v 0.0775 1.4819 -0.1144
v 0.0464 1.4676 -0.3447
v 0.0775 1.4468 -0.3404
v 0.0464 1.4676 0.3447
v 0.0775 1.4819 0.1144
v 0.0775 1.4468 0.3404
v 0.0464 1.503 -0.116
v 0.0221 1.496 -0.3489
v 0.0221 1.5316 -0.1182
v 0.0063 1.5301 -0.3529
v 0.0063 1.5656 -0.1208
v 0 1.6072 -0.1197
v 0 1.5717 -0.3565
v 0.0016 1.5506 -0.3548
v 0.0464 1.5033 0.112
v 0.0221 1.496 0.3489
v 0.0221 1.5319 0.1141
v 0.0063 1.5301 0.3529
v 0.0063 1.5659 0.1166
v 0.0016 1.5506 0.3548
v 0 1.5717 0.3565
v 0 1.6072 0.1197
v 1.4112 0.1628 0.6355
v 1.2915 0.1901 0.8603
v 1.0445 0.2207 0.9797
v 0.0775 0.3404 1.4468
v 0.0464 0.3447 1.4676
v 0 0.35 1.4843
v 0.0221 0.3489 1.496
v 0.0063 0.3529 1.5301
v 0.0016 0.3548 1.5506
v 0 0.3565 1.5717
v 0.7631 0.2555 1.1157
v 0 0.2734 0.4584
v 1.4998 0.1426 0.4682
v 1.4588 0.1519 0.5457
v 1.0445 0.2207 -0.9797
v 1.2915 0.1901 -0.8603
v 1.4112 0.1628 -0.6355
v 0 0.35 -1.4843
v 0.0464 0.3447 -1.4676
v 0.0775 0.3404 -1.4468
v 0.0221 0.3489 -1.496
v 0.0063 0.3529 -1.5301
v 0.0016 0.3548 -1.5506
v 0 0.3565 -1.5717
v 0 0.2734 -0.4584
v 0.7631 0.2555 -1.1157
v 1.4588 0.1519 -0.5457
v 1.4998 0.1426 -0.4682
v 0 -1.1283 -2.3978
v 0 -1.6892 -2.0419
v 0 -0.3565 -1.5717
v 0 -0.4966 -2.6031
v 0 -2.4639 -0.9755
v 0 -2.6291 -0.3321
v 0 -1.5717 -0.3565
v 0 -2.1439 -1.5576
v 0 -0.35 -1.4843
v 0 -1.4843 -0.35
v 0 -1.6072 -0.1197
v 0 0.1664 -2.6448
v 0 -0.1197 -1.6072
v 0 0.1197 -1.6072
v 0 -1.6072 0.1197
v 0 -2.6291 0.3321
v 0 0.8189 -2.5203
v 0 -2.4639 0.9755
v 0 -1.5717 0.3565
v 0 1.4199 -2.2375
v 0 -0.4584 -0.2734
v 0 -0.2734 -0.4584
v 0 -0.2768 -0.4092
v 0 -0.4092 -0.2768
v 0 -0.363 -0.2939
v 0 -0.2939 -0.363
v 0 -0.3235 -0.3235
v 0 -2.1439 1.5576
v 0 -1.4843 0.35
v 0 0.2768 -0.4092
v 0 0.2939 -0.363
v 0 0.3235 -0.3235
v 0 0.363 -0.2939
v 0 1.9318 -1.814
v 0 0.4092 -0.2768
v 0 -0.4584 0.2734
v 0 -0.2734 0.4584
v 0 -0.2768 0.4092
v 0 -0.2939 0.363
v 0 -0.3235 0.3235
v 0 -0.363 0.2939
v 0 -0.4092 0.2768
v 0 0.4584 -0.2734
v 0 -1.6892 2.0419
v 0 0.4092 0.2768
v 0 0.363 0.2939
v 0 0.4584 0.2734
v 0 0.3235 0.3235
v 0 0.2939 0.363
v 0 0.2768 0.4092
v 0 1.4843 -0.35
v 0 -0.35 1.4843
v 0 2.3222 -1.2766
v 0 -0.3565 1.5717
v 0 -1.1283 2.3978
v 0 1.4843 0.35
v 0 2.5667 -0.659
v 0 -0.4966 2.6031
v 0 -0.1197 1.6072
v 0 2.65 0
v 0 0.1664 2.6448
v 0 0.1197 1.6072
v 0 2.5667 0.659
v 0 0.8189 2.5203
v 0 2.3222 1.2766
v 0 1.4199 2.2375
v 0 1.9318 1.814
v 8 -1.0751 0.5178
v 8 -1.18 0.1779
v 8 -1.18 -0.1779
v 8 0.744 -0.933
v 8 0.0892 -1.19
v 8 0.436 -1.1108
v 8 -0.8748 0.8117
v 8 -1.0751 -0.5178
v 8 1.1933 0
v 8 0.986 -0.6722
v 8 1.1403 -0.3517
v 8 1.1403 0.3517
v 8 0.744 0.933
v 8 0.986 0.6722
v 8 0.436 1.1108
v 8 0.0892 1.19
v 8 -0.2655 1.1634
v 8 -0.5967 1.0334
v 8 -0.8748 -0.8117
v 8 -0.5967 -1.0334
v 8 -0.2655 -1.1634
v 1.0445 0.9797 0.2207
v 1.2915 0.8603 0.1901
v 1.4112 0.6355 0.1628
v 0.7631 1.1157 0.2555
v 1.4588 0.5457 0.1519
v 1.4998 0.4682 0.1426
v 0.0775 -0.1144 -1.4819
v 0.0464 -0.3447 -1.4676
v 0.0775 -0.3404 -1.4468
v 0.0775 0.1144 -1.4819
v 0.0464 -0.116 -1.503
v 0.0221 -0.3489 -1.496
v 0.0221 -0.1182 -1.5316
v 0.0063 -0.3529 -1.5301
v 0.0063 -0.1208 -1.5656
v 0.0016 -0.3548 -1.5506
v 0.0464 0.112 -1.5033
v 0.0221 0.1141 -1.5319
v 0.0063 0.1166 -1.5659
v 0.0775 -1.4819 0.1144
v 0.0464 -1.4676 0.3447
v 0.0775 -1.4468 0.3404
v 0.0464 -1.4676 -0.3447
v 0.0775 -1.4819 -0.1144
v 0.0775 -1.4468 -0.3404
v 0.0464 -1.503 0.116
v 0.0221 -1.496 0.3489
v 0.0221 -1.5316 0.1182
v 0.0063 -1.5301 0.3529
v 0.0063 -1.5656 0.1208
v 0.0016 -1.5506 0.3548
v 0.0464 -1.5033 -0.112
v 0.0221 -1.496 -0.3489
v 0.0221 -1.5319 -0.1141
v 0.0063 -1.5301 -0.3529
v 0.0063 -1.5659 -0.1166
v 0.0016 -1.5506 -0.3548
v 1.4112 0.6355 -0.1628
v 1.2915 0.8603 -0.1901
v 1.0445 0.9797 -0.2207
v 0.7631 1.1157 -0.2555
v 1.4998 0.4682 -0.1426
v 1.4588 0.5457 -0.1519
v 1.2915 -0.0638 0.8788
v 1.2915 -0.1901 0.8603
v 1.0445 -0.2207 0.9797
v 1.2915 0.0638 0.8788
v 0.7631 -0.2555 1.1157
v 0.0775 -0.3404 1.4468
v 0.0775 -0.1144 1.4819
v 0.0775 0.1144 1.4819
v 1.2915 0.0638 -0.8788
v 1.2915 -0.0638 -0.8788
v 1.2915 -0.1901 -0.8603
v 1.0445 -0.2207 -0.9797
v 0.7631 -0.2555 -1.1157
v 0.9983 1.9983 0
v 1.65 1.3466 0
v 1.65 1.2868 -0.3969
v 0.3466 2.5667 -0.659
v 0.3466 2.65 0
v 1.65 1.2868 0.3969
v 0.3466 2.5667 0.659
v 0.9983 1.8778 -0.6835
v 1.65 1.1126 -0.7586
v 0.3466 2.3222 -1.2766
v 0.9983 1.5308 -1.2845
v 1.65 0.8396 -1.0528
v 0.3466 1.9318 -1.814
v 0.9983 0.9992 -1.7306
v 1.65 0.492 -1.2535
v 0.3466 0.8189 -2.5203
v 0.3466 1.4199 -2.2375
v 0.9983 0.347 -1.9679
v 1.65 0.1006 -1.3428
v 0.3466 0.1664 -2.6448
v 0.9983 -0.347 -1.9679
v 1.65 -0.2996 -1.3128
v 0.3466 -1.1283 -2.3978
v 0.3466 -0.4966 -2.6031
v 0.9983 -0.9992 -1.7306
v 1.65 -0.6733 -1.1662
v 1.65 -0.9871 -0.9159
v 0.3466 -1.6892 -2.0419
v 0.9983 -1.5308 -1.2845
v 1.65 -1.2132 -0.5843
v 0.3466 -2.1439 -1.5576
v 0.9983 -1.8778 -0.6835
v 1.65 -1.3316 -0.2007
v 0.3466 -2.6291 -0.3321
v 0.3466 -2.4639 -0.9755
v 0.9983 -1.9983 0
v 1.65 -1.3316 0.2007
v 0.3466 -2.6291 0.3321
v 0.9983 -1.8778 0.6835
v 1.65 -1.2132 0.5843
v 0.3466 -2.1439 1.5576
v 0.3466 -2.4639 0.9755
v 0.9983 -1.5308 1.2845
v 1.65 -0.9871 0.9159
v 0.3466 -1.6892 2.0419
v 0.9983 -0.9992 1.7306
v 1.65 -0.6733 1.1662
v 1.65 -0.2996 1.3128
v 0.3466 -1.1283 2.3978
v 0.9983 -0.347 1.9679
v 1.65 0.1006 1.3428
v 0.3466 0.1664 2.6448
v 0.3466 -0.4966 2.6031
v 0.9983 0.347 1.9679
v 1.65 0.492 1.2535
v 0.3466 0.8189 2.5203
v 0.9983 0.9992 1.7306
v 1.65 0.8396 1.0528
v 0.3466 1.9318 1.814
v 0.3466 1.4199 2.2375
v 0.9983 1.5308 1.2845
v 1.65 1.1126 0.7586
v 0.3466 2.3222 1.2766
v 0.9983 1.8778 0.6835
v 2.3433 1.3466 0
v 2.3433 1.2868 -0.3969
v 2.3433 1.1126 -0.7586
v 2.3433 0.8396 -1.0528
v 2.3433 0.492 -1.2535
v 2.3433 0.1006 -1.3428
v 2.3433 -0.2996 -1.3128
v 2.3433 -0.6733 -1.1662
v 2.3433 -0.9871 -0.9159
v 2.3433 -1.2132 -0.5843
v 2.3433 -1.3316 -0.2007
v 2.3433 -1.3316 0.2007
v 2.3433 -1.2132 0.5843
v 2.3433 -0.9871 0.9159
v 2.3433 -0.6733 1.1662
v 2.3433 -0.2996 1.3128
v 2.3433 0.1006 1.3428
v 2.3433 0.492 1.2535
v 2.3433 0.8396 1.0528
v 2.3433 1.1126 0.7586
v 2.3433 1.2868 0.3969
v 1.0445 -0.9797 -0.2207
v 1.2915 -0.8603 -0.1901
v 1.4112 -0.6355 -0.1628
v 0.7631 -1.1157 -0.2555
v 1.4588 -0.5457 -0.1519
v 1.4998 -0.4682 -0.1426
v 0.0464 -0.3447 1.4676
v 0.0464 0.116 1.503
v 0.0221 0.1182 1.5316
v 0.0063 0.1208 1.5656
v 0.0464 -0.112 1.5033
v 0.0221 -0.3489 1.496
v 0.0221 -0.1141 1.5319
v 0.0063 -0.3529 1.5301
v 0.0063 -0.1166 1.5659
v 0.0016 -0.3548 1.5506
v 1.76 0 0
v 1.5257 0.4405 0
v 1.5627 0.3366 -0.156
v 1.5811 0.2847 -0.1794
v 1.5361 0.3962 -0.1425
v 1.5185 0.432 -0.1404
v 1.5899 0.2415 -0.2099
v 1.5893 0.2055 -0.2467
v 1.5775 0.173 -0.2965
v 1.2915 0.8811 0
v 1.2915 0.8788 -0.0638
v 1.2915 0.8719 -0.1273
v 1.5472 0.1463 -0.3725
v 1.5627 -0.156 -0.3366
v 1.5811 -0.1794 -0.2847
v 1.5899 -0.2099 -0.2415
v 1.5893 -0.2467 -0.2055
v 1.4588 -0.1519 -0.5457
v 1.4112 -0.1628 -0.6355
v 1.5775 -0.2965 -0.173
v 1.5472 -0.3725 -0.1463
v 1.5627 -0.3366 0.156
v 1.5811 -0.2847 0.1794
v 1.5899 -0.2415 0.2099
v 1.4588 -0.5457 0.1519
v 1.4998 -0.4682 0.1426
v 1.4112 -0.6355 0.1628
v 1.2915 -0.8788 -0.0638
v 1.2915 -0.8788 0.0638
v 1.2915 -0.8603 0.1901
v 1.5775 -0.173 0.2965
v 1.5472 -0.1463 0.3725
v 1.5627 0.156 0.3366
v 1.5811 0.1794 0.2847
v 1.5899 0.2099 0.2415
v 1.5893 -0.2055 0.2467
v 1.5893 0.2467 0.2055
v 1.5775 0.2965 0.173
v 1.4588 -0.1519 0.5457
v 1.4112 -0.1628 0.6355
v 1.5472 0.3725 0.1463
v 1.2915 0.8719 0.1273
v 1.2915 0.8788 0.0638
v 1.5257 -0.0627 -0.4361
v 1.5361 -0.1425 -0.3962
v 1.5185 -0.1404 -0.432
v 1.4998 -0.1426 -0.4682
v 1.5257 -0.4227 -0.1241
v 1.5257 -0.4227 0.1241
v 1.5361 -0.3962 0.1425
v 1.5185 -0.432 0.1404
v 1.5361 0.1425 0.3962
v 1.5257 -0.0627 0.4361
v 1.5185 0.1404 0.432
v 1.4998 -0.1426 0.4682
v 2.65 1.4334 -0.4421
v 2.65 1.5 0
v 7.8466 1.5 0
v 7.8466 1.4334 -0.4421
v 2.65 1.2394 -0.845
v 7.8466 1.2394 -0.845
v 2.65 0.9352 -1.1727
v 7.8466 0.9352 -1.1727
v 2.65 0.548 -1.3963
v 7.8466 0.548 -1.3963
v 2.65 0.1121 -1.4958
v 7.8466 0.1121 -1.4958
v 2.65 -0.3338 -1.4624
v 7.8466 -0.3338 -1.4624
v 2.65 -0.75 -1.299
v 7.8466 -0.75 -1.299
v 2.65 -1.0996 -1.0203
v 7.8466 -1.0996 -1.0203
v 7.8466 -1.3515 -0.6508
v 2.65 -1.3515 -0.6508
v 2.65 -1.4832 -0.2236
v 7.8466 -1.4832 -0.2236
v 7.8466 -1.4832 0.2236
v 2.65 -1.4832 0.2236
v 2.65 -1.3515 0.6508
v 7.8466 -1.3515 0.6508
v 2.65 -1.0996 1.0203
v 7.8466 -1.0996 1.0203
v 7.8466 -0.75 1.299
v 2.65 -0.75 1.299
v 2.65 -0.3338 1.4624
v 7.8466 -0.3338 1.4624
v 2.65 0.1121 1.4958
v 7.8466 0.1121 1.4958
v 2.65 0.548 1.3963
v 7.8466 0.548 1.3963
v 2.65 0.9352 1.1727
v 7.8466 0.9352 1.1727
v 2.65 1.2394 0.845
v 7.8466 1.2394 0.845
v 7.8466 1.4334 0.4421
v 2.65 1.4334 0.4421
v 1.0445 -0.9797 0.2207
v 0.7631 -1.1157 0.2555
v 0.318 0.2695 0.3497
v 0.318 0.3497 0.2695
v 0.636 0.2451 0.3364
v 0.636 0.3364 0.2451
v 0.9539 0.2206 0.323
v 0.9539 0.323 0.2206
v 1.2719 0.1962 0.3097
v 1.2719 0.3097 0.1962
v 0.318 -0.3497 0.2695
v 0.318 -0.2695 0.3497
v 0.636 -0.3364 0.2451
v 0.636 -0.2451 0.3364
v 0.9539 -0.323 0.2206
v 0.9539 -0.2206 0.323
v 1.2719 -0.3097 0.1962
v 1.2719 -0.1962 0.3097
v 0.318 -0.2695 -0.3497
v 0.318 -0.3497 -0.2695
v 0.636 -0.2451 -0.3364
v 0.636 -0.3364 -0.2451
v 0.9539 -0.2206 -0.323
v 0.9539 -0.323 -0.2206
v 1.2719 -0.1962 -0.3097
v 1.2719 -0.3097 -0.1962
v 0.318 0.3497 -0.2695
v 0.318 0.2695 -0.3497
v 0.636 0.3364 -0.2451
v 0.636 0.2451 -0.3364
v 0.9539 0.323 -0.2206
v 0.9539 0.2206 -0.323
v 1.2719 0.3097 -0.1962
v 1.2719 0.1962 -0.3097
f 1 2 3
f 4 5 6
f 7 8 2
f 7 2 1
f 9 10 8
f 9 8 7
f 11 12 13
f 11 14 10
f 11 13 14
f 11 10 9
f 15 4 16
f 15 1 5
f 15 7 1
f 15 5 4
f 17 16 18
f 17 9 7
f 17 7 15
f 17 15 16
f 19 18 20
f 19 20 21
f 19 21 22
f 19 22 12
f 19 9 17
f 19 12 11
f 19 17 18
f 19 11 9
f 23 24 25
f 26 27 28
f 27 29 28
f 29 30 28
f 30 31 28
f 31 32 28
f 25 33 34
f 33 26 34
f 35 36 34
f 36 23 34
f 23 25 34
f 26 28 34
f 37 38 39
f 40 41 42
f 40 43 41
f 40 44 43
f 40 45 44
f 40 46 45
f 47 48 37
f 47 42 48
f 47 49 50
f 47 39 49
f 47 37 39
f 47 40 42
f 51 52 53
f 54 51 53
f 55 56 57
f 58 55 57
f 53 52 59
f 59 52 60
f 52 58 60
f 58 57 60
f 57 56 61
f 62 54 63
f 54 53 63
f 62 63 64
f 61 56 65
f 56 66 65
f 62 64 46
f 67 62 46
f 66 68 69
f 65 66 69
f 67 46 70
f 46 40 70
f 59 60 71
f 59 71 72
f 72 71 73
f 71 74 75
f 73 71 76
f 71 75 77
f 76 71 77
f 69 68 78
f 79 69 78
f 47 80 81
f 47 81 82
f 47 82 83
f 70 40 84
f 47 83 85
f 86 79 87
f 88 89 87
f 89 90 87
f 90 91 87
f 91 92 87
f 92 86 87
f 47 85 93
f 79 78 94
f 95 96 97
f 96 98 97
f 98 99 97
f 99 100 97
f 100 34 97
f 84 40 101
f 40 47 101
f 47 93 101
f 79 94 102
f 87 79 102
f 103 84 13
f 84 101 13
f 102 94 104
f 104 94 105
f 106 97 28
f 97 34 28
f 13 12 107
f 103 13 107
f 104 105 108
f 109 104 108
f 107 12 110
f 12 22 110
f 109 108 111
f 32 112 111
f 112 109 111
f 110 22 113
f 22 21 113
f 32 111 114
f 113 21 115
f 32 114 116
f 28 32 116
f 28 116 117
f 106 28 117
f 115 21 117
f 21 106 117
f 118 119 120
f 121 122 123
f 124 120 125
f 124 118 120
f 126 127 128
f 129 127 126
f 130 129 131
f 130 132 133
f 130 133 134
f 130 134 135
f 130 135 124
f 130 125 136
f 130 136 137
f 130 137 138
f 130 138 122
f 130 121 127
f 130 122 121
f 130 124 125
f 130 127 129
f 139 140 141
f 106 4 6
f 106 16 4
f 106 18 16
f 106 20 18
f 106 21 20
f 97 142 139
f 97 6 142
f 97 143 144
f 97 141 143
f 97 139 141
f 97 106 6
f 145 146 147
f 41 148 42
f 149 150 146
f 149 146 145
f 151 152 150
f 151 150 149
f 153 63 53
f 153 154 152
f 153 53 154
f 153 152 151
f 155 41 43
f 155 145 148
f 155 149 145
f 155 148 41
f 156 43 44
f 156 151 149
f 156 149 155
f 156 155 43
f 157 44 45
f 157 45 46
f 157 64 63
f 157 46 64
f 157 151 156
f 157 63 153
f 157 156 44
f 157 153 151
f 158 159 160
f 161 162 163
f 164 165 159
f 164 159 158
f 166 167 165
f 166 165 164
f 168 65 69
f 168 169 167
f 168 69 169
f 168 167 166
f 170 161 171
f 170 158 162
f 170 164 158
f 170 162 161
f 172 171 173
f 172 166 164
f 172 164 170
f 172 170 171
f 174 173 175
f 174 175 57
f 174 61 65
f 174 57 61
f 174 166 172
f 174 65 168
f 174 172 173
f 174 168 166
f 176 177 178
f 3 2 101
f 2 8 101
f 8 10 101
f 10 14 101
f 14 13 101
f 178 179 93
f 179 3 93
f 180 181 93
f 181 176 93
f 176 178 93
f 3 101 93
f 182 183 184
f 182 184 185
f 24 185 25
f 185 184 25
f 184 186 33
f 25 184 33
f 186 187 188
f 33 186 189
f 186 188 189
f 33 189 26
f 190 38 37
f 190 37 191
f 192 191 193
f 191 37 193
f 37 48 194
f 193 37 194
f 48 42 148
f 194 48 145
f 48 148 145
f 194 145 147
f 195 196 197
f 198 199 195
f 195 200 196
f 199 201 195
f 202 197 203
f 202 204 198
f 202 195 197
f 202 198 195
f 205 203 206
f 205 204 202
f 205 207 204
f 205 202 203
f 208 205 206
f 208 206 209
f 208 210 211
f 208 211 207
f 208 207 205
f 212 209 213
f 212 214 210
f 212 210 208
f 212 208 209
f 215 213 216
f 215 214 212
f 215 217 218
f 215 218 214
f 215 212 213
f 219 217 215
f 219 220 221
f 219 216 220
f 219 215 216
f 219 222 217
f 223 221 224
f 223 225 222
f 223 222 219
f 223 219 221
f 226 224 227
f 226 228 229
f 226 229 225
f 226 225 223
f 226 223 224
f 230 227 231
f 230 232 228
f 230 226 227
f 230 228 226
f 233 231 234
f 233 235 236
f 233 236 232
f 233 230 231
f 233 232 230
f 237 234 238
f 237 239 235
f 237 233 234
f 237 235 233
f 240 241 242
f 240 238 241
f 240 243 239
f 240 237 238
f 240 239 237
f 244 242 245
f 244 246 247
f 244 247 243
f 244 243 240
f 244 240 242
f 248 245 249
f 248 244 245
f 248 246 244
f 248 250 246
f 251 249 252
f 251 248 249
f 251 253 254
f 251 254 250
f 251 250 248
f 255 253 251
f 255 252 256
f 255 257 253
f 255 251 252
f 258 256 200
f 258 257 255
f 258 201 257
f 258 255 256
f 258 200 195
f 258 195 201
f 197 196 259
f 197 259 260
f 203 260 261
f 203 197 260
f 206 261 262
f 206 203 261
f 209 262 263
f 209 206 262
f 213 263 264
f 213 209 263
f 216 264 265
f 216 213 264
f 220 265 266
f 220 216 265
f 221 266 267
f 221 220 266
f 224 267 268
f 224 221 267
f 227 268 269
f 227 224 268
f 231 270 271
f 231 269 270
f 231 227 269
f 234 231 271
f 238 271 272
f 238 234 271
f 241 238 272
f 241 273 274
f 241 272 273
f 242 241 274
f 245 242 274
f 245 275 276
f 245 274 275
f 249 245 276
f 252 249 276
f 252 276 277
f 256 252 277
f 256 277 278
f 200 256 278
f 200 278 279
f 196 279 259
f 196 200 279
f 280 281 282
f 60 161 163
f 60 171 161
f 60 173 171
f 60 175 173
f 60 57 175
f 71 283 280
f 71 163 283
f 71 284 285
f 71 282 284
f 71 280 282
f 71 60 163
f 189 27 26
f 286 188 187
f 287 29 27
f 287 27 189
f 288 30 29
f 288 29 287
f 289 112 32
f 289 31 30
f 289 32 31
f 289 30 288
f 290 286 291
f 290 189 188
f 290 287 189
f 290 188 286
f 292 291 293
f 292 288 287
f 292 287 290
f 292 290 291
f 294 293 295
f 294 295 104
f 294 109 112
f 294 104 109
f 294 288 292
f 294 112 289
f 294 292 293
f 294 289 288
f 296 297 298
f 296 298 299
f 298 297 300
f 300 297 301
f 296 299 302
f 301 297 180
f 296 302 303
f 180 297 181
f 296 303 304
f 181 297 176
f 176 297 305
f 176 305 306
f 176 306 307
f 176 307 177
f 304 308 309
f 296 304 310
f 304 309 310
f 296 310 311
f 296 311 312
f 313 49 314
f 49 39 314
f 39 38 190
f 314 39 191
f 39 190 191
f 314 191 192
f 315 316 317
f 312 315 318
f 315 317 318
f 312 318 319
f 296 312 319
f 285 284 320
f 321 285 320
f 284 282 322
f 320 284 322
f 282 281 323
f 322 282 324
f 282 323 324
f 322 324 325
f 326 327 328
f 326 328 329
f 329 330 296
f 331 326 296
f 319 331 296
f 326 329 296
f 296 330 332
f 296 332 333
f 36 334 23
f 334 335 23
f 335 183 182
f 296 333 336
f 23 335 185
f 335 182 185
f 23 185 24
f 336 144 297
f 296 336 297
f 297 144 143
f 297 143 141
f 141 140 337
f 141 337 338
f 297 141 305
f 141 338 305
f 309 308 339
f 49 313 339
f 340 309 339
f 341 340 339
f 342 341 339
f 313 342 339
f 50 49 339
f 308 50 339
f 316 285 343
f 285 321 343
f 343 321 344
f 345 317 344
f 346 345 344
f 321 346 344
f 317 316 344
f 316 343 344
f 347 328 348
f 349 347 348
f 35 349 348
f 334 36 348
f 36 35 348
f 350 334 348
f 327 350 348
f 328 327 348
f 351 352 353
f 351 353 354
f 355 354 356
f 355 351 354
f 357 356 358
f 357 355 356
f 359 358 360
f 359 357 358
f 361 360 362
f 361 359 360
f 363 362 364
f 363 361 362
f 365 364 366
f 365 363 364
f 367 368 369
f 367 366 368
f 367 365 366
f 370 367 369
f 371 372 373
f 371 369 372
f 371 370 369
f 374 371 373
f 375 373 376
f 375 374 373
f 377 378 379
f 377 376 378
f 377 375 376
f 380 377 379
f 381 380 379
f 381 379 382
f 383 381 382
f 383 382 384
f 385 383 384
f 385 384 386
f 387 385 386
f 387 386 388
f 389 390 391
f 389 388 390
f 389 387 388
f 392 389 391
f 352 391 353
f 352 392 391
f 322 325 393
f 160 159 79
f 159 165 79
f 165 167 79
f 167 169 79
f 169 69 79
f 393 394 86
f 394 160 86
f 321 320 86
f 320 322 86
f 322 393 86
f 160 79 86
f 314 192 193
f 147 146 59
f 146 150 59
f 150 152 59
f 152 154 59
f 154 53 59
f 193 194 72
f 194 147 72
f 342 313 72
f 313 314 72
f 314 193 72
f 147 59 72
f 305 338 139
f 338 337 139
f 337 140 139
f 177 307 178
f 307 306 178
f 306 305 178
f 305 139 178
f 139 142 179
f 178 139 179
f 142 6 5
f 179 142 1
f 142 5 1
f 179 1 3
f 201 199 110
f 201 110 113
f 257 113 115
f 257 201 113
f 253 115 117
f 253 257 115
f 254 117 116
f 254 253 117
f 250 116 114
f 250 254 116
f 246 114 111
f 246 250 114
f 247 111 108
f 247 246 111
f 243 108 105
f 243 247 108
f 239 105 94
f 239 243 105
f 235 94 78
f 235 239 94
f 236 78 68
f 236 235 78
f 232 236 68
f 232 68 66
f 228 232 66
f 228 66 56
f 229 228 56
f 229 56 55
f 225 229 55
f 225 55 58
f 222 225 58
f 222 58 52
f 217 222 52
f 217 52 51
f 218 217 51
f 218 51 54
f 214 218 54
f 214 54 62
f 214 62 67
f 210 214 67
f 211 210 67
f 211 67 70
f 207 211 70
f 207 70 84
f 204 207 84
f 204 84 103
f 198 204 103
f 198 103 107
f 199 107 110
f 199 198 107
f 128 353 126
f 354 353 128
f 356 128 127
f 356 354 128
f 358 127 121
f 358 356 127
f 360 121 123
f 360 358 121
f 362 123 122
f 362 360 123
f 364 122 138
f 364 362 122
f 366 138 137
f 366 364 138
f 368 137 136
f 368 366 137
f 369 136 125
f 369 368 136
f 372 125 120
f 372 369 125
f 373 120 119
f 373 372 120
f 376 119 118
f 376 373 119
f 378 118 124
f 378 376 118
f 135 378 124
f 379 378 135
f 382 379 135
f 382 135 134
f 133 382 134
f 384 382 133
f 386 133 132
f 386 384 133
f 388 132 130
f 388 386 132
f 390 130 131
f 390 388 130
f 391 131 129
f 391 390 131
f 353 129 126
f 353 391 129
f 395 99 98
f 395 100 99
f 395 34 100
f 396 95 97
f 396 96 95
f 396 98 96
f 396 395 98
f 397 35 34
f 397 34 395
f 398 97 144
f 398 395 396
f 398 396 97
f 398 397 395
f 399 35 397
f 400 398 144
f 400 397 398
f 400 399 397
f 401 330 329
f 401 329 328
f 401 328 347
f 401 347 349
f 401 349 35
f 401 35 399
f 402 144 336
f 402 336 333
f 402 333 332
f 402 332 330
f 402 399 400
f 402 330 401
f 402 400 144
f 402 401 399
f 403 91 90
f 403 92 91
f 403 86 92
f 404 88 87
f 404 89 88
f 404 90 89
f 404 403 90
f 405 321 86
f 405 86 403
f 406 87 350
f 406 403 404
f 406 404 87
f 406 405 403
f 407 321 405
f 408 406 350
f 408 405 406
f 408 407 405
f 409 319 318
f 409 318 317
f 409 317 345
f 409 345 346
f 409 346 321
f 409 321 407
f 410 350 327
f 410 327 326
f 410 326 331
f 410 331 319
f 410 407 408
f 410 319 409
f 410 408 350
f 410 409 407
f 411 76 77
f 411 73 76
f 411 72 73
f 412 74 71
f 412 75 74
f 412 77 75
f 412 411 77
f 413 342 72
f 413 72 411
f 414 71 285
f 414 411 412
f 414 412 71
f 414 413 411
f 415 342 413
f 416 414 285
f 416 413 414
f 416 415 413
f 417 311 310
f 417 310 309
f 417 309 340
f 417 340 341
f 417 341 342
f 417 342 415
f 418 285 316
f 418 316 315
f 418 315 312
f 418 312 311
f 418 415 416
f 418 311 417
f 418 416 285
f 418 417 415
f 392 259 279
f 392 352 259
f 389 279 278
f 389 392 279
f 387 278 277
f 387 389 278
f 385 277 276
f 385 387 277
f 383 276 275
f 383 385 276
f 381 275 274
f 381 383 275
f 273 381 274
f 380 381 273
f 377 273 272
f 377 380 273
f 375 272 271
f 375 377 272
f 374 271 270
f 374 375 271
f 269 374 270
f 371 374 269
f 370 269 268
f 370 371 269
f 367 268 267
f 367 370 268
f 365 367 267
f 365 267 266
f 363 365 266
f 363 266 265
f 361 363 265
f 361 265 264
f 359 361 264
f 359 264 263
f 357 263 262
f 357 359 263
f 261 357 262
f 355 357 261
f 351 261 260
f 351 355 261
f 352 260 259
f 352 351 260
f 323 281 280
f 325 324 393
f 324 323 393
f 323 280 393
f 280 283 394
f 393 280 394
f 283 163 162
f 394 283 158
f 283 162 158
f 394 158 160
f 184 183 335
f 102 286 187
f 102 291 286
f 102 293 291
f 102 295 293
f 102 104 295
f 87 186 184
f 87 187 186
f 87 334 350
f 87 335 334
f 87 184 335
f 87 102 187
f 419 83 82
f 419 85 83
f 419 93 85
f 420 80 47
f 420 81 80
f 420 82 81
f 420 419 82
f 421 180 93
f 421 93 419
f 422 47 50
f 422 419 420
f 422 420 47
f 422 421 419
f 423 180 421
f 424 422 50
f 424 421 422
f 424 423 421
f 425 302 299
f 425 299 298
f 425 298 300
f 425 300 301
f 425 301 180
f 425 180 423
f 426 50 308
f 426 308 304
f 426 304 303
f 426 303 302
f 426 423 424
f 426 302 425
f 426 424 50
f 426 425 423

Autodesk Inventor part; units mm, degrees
ref_plane "YZ Plane" through (0, 0, 0) normal (1, 0, 0) x (0, 1, 0)
ref_plane "XZ Plane" through (0, 0, 0) normal (0, 1, 0) x (-1, 0, 0)
sketch "Szkic1" plane through (0, 0, 0) normal (0, 0, 1) x (1, 0, 0)
  line L0 (1.76, 0) -> (8, 0)
  line L1 (8, 0) -> (8, 1.5)
  line L2 (8, 1.5) -> (2.65, 1.5)
  line L3 (2.65, 1.5) -> (2.3433, 1.3466)
  line L4 (2.3433, 1.3466) -> (1.65, 1.3466)
  line L5 (0, 2.65) -> (0, 1.525)
  line L6 (0, 1.525) -> (1.2915, 0.8811)
  line L7 (1.2915, 0.8811) -> (1.76, 0)
  line L8 (-1.6, 0) -> (9.6, 0) projected
  line L9 (0, -0.53) -> (0, 3.18) projected
  line L10 (0, 2.65) -> (0.3466, 2.65)
  line L11 (0.3466, 2.65) -> (1.65, 1.3466)
  line L12 (2.65, 1.5) -> (1.4966, 1.5) construction
  dimension "d1" = 5.35
  dimension "d2" = 3
  dimension "d3" = 2.6933
  dimension "d4" = 3.05
  dimension "d5" = 26.5
  dimension "d6" = 62
  dimension "d7" = 1.76
  dimension "d8" = 0.3067
  dimension "d12" = 5.3
  dimension "d13" = 45
  dimension "d15" = 8
  dimension "d24" = 1.65
revolve "Bryła" add sketch "Szkic1" angle 360 about axis through (1.76, 0, 0) along (1, 0, 0) contours L7 L6 L5 L10 L11 L4 L3 L2 L1 L0
sketch "Szkic2" plane through (0, 0, 0) normal (-1, 0, 0) x (0, 0, 1)
  line L0 (0, 1.525) -> (0, 0) construction
  line L1 (0, 0) -> (1.525, 0) construction
  arc A0 (0.4575, 0) -> (0, 0.4575) centre (0, 0) ccw construction
  arc A1 (0.5338, 0) -> (0, 0.5337) centre (0, 0) ccw construction
  arc A2 (1.4843, 0.35) -> (0.35, 1.4843) centre (0, 0) ccw
  line L2 (0, 0) -> (1.0783, 1.0783) construction
  line L3 (0.35, 1.4843) -> (0.2734, 0.4584)
  line L4 (1.4843, 0.35) -> (0.4584, 0.2734)
  arc A3 (0.35, 1.4843) -> (0, 1.525) centre (0, 0) ccw
  arc A4 (1.525, 0) -> (1.4843, 0.35) centre (0, 0) ccw
  line L5 (0, -3.71) -> (0, 3.71) projected
  line L6 (-3.71, 0) -> (3.71, 0) projected
  arc A5 (0.35, -1.4843) -> (1.4843, -0.35) centre (0, 0) ccw
  line L7 (0.35, -1.4843) -> (0.2734, -0.4584)
  line L8 (1.4843, -0.35) -> (0.4584, -0.2734)
  arc A6 (0, -1.525) -> (0.35, -1.4843) centre (0, 0) ccw
  arc A7 (1.4843, -0.35) -> (1.525, 0) centre (0, 0) ccw
  arc A8 (-0.35, 1.4843) -> (-1.4843, 0.35) centre (0, 0) ccw
  line L9 (-0.35, 1.4843) -> (-0.2734, 0.4584)
  line L10 (-1.4843, 0.35) -> (-0.4584, 0.2734)
  arc A9 (0, 1.525) -> (-0.35, 1.4843) centre (0, 0) ccw
  arc A10 (-1.4843, 0.35) -> (-1.525, 0) centre (0, 0) ccw
  arc A11 (-0.35, -1.4843) -> (0, -1.525) centre (0, 0) ccw
  arc A12 (-1.4843, -0.35) -> (-0.35, -1.4843) centre (0, 0) ccw
  arc A13 (-1.525, 0) -> (-1.4843, -0.35) centre (0, 0) ccw
  line L11 (-1.4843, -0.35) -> (-0.4584, -0.2734)
  line L12 (-0.35, -1.4843) -> (-0.2734, -0.4584)
  arc A14 (0.2734, 0.4584) -> (0.4584, 0.2734) centre (0.4455, 0.4455) ccw
  arc A15 (0.4584, -0.2734) -> (0.2734, -0.4584) centre (0.4455, -0.4455) ccw
  arc A16 (-0.4584, 0.2734) -> (-0.2734, 0.4584) centre (-0.4455, 0.4455) ccw
  arc A17 (-0.2734, -0.4584) -> (-0.4584, -0.2734) centre (-0.4455, -0.4455) ccw
  point P0 (1.0783, -1.0783)
  point P1 (-1.0783, 1.0783)
  point P2 (-1.0783, -1.0783)
  dimension "d17" = 0.915
  dimension "d18" = 1.0675
  dimension "d19" = 3.05
  dimension "d20" = 45
  dimension "d21" = 0.35
extrude "Szczelina" add sketch "Szkic2" against normal up to next draft 5 contours L4 A14 L3 A2 | A5 L7 A15 L8 | L9 A16 L10 A8 | A12 L11 A17 L12
fillet "Zaokrąglenie1" radius 0.14 4 edges at (0, 1.525, 0) (0, 0, -1.525) (0, -1.525, 0) (0, 0, 1.525)
thread "Gwint" size "M3x0.5" class "6g" standard "ISO Metric profile" length 5.35
chamfer "Faza1" distance 0.3067 distance2 0.1534 1 edges at (8, -1.5, 0) measured on face at (8, 0.3888, 0.4512)
ref_plane "Work Plane2" through (3.35, 0, 0) normal (0, 0, -1) x (1, 0, 0)
equation "\"d1\" = GEL"
equation "\"d2\" = GD"
equation "\"d3\" = BDM"
equation "\"d4\" = SDM"
equation "\"d7\" = INTI"
equation "\"d8\" = GAL"
equation "\"d12\" = KOD"
equation "\"d13\" = 0.5 * SEWI"
equation "\"d15\" = NLG"
equation "\"d24\" = KOH"
equation "\"d17\" = 0.3 * SDM"
equation "\"d18\" = 0.35 * SDM"
equation "\"d19\" = SDM"
equation "\"d21\" = 0.5 * SBR"
equation "\"d23\" = 0.2 * SBR"
equation "\"d10\" = GEL"
equation "\"d25\" = -0.5 * SPD + 0.5 * GD"
equation "\"d26\" = 0.5 * GAL"
equation "\"NLG\" = 8"
equation "\"GEL\" = 5.35"
equation "\"GAL\" = 0.61345 * PTC"
equation "\"SPD\" = NND - 1.2269 * PTC"
equation "\"KOD\" = 5.3"
equation "\"KOH\" = 1.65"
equation "\"SBR\" = 0.7"
equation "\"INTI\" = 1.76"
equation "\"SDM\" = 3.05"
equation "\"GD\" = NND"
equation "\"BDM\" = NND - GAL"
equation "\"SEWI\" = 90deg"
equation "\"d9\" = SDM"
equation "\"GUL\" = 0.61345 * PTC"
equation "\"TOA\" = 30deg"
equation "\"EPV\" = 3.15"
equation "\"THREADDIA\" = 3"
equation "\"RR\" = 0.3"
equation "\"PTC\" = 0.5"
equation "\"NND\" = 3"
equation "\"GD1\" = THREADDIA - 1.2269 * PTC"
properties part number "AS 1427 - M3 x 8" material "Stal, miękka"
